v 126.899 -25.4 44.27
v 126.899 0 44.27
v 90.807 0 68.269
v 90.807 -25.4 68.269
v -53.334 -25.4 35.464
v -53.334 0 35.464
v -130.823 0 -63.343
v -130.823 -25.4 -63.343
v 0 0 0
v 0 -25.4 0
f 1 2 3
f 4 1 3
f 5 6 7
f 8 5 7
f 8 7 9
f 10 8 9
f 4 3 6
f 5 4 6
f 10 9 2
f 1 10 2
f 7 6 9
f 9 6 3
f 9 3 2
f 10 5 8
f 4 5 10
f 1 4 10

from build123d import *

# Parameters (mm, degrees)
F1_DEPTH = 25.4


with BuildPart() as f1:
    # F0 (on Front) → F1 (new body)
    with BuildSketch(Plane.XZ):
        Polygon((-130.822942, -63.342907), (0, 0), (-53.333733, 35.463728), align=None)
        Polygon((-53.333733, 35.463728), (0, 0), (126.89946, 44.269524), (90.807401, 68.268575), align=None)
    extrude(amount=F1_DEPTH)


solid = f1.part
